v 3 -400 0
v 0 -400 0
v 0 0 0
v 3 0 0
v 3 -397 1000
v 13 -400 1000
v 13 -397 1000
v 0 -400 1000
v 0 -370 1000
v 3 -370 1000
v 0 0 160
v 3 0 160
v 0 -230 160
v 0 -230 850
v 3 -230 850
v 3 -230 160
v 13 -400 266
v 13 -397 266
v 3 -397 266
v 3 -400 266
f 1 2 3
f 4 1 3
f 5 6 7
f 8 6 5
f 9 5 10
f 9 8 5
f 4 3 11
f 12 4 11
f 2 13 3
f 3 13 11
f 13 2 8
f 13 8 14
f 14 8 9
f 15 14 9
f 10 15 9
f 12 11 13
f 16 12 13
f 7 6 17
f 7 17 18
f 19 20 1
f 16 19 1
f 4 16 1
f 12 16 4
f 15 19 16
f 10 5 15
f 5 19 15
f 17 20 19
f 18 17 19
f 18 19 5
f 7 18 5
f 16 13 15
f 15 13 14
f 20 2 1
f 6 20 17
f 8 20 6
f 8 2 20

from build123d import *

# Parameters (mm, degrees)
F1_DEPTH = 3
F2_W     = 3
F2_H     = 734
F3_DEPTH = 10


with BuildPart() as f1:
    # F0 (on Right) → F1 (new body)
    with BuildSketch(Plane.YZ):
        Polygon((-400, 0), (0, 0), (0, 160), (-230, 160), (-230, 850), (-370, 1000), (-400, 1000), align=None)
    extrude(amount=F1_DEPTH)

    # F2 (on face) → F3 (join)
    with BuildSketch(Plane.YZ.offset(3)):
        with Locations((-398.5, 633)):
            Rectangle(F2_W, F2_H)
    extrude(amount=F3_DEPTH)


solid = f1.part
